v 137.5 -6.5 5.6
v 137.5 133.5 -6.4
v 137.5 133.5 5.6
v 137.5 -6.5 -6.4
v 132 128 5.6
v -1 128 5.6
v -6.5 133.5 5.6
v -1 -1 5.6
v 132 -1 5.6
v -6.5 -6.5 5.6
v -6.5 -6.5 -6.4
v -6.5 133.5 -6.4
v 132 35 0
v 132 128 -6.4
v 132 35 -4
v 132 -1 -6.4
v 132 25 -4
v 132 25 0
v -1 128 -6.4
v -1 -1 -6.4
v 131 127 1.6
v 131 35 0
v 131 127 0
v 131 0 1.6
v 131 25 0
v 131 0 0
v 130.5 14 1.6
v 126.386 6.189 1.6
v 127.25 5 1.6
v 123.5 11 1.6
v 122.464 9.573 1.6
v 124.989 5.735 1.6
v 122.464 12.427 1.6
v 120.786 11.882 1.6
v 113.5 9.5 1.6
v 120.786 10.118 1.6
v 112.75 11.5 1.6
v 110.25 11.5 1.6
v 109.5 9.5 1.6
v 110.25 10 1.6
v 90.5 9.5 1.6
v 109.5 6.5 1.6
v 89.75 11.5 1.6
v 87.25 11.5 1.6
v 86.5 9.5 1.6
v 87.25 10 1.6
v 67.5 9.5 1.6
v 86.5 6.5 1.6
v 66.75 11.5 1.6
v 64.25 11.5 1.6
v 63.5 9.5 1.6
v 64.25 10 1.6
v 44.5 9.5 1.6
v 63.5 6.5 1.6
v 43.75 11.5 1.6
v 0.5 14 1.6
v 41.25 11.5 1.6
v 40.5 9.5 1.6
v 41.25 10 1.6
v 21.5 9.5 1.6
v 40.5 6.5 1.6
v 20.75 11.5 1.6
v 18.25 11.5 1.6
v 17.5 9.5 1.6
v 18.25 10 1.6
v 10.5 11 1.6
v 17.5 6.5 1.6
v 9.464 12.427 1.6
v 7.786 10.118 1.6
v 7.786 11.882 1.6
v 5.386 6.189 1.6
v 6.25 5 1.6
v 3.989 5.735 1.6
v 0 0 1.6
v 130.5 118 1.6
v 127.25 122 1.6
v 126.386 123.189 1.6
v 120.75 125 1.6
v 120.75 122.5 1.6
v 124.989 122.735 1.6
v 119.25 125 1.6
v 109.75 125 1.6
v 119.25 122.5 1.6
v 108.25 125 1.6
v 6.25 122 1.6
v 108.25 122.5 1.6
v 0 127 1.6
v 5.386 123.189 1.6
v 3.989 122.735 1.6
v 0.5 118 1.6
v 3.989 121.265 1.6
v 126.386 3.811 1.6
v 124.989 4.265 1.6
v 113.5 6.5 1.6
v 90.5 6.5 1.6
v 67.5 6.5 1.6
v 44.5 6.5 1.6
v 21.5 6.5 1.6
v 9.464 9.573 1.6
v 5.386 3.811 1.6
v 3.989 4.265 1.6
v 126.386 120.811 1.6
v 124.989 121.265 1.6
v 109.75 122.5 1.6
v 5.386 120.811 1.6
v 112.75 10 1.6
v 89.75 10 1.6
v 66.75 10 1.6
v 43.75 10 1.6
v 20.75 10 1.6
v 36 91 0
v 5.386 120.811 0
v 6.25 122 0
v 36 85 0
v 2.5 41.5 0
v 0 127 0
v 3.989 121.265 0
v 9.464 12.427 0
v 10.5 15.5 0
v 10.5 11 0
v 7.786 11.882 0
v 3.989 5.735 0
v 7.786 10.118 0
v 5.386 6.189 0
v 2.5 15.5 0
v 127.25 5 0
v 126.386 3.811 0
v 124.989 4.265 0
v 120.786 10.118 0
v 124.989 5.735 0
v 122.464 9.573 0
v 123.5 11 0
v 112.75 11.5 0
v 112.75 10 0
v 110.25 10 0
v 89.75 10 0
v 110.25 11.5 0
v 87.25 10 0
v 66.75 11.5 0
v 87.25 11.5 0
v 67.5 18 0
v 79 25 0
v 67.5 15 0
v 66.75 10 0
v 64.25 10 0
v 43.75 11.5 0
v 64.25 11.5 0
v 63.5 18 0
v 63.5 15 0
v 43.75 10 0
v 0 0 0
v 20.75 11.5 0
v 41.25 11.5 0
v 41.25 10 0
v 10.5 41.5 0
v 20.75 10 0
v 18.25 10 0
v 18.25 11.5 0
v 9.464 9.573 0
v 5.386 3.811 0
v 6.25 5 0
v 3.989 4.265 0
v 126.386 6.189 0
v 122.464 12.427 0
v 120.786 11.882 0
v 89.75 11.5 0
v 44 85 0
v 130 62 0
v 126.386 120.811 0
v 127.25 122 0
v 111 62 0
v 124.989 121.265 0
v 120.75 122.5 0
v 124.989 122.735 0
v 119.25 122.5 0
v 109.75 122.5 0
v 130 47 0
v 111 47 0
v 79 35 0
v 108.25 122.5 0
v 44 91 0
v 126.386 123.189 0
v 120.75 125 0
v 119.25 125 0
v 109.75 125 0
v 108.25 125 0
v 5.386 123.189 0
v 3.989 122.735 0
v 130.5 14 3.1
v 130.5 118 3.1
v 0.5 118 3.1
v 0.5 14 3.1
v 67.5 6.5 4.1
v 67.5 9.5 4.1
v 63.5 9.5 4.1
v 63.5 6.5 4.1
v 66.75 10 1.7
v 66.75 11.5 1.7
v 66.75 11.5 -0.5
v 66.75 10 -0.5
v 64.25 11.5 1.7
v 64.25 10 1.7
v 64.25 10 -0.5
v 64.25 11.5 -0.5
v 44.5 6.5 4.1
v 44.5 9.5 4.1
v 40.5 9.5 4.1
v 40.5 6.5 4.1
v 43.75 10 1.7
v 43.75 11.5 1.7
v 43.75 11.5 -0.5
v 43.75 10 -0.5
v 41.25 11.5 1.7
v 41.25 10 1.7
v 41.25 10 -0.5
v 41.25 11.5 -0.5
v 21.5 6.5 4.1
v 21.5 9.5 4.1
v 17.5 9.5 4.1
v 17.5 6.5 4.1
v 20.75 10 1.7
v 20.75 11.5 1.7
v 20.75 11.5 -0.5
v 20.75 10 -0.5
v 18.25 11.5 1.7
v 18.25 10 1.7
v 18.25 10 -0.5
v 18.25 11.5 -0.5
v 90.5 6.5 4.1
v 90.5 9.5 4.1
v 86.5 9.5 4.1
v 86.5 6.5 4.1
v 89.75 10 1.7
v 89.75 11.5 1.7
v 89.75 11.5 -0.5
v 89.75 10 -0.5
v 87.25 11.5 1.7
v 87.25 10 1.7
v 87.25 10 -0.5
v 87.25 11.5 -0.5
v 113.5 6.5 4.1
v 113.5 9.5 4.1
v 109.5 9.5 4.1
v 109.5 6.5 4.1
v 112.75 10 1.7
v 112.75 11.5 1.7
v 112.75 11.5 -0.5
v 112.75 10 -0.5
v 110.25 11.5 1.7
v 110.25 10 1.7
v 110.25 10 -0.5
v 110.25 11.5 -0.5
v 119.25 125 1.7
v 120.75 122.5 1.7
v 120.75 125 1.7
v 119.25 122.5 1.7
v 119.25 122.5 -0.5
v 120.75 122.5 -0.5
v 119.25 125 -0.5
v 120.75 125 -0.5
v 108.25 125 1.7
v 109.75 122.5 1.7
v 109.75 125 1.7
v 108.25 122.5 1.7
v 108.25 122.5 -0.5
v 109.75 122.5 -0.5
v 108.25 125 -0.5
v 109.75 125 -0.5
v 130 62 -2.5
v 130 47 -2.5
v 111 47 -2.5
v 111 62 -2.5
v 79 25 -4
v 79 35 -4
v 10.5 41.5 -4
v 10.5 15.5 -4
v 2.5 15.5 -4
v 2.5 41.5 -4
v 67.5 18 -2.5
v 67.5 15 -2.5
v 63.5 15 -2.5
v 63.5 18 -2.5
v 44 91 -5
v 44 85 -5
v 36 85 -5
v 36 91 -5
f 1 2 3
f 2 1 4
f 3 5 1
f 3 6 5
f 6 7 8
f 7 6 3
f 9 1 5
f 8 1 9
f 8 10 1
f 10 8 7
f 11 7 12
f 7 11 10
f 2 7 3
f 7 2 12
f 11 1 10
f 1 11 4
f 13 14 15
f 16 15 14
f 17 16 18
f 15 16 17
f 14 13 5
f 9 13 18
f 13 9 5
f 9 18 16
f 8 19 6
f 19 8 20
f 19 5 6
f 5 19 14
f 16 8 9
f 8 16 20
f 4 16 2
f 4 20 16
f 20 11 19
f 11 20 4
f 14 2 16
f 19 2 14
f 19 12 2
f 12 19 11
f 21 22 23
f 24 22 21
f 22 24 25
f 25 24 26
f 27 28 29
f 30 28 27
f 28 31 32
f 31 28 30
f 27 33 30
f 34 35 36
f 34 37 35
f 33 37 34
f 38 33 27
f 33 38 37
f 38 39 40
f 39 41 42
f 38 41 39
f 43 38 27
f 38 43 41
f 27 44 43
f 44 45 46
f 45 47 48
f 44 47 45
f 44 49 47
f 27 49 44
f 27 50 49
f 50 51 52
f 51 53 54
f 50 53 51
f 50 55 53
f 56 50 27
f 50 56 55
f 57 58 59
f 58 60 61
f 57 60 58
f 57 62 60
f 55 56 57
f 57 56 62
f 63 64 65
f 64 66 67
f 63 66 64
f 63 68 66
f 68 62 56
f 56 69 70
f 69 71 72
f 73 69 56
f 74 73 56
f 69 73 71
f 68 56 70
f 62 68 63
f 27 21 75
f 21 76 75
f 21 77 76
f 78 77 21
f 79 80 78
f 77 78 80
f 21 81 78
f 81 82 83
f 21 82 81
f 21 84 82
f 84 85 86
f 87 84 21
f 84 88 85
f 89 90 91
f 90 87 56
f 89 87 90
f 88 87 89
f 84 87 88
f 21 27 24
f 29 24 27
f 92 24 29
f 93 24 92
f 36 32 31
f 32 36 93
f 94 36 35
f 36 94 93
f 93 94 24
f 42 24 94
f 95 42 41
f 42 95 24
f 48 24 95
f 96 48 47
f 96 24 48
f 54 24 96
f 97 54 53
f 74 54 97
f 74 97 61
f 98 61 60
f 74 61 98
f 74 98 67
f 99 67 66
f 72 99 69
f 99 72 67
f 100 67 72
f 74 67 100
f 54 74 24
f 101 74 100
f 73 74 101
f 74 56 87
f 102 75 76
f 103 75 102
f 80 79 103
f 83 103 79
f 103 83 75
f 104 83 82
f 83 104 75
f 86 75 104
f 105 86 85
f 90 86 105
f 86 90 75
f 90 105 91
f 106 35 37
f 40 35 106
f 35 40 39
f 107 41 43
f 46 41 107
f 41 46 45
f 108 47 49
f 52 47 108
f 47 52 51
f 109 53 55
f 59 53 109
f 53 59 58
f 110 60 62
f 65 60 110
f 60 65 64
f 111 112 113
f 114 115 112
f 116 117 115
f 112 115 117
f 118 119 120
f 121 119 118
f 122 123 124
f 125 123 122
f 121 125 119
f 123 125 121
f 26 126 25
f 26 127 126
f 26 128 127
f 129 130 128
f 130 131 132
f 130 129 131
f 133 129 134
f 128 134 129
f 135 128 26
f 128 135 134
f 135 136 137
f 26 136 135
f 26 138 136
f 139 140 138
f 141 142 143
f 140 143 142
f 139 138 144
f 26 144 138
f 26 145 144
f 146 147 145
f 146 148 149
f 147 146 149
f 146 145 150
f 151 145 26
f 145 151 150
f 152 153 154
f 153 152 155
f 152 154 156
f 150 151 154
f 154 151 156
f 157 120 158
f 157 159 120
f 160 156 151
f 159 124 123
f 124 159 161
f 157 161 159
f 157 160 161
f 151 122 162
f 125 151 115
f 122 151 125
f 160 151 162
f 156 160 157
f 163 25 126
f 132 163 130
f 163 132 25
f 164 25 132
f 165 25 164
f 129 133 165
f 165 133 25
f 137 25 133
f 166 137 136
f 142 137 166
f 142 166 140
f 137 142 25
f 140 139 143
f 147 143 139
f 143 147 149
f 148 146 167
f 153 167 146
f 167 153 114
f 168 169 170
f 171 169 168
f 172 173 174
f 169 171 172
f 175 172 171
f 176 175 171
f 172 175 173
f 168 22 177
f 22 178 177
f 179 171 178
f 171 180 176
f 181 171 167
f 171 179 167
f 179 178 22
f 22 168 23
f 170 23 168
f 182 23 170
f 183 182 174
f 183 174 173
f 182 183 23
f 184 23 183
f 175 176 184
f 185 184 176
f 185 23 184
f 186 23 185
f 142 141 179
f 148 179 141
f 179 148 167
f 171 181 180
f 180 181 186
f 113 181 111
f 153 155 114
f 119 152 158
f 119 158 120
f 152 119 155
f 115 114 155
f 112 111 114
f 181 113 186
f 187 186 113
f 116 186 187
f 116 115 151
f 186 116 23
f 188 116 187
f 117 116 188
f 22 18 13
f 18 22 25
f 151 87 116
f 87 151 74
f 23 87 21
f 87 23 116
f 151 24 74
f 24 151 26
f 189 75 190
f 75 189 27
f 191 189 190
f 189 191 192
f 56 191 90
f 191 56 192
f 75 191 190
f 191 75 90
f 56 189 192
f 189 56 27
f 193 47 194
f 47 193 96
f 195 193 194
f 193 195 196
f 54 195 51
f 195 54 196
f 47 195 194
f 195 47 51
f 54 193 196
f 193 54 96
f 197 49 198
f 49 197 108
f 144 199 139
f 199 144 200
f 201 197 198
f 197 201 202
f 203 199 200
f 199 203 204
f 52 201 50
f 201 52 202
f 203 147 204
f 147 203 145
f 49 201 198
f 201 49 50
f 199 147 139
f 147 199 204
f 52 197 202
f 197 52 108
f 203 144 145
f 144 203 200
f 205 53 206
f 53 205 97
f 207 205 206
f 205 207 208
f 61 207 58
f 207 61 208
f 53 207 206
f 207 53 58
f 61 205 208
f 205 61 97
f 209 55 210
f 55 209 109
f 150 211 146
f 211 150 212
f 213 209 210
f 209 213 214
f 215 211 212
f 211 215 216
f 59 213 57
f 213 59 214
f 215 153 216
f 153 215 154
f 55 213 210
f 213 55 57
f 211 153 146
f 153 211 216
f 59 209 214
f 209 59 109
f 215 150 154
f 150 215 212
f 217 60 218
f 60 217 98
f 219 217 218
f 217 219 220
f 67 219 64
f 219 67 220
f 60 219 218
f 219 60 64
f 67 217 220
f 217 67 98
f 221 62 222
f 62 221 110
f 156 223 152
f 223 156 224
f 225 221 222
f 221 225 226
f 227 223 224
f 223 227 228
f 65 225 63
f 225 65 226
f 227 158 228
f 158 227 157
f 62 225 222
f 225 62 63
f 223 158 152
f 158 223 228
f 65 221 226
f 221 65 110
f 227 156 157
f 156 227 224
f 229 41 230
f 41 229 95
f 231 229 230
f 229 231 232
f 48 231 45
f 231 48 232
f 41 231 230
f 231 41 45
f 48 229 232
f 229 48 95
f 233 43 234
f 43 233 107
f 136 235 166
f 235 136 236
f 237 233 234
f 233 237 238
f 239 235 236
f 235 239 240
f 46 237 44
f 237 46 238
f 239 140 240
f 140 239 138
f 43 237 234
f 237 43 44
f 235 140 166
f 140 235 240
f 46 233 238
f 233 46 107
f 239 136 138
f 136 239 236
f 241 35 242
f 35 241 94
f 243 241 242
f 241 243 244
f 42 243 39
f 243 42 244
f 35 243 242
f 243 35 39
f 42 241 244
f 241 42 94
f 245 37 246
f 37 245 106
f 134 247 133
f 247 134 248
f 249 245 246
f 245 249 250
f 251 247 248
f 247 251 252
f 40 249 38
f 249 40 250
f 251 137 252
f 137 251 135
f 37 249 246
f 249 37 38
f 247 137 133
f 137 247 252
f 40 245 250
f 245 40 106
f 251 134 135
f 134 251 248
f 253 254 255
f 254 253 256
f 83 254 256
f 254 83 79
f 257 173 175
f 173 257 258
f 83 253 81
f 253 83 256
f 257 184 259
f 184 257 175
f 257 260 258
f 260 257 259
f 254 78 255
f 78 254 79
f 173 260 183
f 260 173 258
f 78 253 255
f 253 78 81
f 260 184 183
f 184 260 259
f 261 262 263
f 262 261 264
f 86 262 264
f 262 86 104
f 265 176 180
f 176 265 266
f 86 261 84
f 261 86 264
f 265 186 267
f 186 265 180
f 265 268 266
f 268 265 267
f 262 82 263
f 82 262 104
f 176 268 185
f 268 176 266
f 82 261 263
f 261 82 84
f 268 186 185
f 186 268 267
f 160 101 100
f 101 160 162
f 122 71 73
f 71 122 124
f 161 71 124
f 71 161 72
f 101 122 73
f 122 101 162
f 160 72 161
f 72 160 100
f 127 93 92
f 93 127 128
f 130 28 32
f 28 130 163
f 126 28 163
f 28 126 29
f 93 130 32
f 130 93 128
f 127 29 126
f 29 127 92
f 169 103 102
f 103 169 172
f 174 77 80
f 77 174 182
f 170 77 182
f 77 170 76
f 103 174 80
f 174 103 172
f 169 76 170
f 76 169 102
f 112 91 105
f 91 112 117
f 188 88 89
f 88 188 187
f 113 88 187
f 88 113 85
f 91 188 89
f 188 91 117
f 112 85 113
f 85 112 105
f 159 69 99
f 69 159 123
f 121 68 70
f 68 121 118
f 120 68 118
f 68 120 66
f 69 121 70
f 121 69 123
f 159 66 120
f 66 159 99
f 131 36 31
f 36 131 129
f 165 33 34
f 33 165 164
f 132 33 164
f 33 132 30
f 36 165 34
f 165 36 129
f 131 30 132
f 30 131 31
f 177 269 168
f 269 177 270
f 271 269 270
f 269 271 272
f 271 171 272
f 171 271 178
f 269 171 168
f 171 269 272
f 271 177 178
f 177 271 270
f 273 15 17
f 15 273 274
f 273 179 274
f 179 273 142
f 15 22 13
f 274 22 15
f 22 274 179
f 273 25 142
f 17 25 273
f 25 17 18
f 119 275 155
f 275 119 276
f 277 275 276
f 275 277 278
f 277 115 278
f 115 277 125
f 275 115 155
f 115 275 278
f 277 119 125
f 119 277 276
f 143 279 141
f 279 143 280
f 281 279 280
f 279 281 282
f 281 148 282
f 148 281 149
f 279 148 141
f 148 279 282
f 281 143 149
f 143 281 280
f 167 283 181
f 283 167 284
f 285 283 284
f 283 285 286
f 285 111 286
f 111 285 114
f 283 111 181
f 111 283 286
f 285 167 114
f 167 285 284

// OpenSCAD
// file: ../../libs/flat-ui-colors.scad
flatui = [
    "#1abc9c",
    "#2ecc71",
    "#3498db",
    "#9b59b6",
    "#34495e",
    "#f1c40f",
    "#e67e22",
    "#e74c3c",
    "#ecf0f1",
    "#95a5a6",
];
// file: ../../libs/teeth.scad
function hash(h,k)= 
(
  h[search([k], h)[0]][1]
); 

module placeTeethY(start, step, count, size) {
    for(i = [0:count]) {
        y = start + (i * step);
        translate([0, y, 0])
        cube(size, center=true);
    }
}

module placeTeethZ(start, step, count, size) {
    for(i = [0:count]) {
        z = start + (i * step);
        translate([0, 0, z])
        cube(size, center=true);
    }
}

module verticalTeeth(translateZ, widthY, depthX, heightZ, count, size, height, spaceBetween = false, padding = 0, nothing = 0.1) {
    avSpace = widthY - (size * count);
    padding = (padding==undef) ? 0 : padding;
    ts = [depthX + nothing + padding, size, height + nothing + padding];
    if (spaceBetween) {
        tbSpace = avSpace / (count - 1);
        tbStep = tbSpace + size;
        tbStart = -(widthY / 2) + (size / 2);
        
        translate([0, 0, translateZ])
        placeTeethY(tbStart, tbStep, count-1, ts);
    } else {
        tbSpace = avSpace / (count + 1);
        tbStep = tbSpace + size;
        tbStart = -(widthY / 2) + tbSpace + (size / 2);
        
        translate([0, 0, translateZ])
        placeTeethY(tbStart, tbStep, count-1, ts);
    }
}

module horizontalTeeth(translateY, widthY, depthX, heightZ, count, size, height, spaceBetween = false, padding = 0, nothing = 0.1) {
    avSpace = heightZ - (size * count);
    padding = (padding==undef) ? 0 : padding;
    ts = [depthX + nothing + padding, height + nothing + padding, size];
    if (spaceBetween) {
        tbSpace = avSpace / (count - 1);
        tbStep = tbSpace + size;
        tbStart = -(heightZ / 2) + (size / 2);
        
        translate([0, translateY, 0])
        placeTeethZ(tbStart, tbStep, count-1, ts);
    } else {
        tbSpace = avSpace / (count + 1);
        tbStep = tbSpace + size;
        tbStart = -(heightZ / 2) + tbSpace + (size / 2);
        
        translate([0, translateY, 0])
        placeTeethZ(tbStart, tbStep, count-1, ts);
    }
}

module bottomTeeth(widthY, depthX, heightZ, count, size, height, spaceBetween = false, padding = 0, nothing = 0.1) {
    z = -(heightZ / 2)-(height/2);
    verticalTeeth(z, widthY, depthX, heightZ, count, size, height, spaceBetween, padding, nothing);
}

module topTeeth(widthY, depthX, heightZ, count, size, height, spaceBetween = false, padding = 0, nothing = 0.1) {
    z = (heightZ / 2)+(height/2);
    verticalTeeth(z, widthY, depthX, heightZ, count, size, height, spaceBetween, padding, nothing);
}

module leftTeeth(widthY, depthX, heightZ, count, size, height, spaceBetween = false, padding = 0, nothing = 0.1) {
    y = -(widthY / 2)-(height / 2);
    horizontalTeeth(y, widthY, depthX, heightZ, count, size, height, spaceBetween, padding, nothing);
}

module rightTeeth(widthY, depthX, heightZ, count, size, height, spaceBetween = false, padding = 0, nothing = 0.1) {
    y = (widthY / 2) + (height / 2);
    horizontalTeeth(y, widthY, depthX, heightZ, count, size, height, spaceBetween, padding, nothing);
}

module teeth(size, opts, nothing = 0.1) {
    union() {
        color("#ef5777") cube(size, center=true);
        
        bc = hash(opts, "bottomCount");
        if (bc > 0) {        
            color("#575fcf") bottomTeeth(
                widthY = size[1],
                depthX = size[0],
                heightZ = size[2],
                count = hash(opts, "bottomCount"),
                size = hash(opts, "bottomSize"),
                height = hash(opts, "bottomHeight"),
                spaceBetween = hash(opts, "bottomSpaceBetween"),
                padding = hash(opts, "bottomPadding"),
                nothing = nothing
            );
        }
        
        tc = hash(opts, "topCount");
        if (tc > 0) {        
            color("#4bcffa") topTeeth(
                widthY = size[1],
                depthX = size[0],
                heightZ = size[2],
                count = hash(opts, "topCount"),
                size = hash(opts, "topSize"),
                height = hash(opts, "topHeight"),
                spaceBetween = hash(opts, "topSpaceBetween"),
                padding = hash(opts, "topPadding"),
                nothing = nothing
            );
        }
        
        lc = hash(opts, "leftCount");
        if (lc > 0) {        
            color("#0be881") leftTeeth(
                widthY = size[1],
                depthX = size[0],
                heightZ = size[2],
                count = hash(opts, "leftCount"),
                size = hash(opts, "leftSize"),
                height = hash(opts, "leftHeight"),
                spaceBetween = hash(opts, "leftSpaceBetween"),
                padding = hash(opts, "leftPadding"),
                nothing = nothing
            );
        }
        
        rc = hash(opts, "rightCount");
        if (rc > 0) {        
            color("#ffc048") rightTeeth(
                widthY = size[1],
                depthX = size[0],
                heightZ = size[2],
                count = hash(opts, "rightCount"),
                size = hash(opts, "rightSize"),
                height = hash(opts, "rightHeight"),
                spaceBetween = hash(opts, "rightSpaceBetween"),
                padding = hash(opts, "rightPadding"),
                nothing = nothing
            );
        }
    }
}


/*opts=[
    ["bottomCount", 3],    
    ["bottomSize", 6],
    ["bottomHeight", 10],
    ["bottomSpaceBetween", true],
    ["bottomPadding", 0.2],

    ["topCount", 3],    
    ["topSize", 6],
    ["topHeight", 10],
    ["topSpaceBetween", false],

    ["leftCount", 3],    
    ["leftSize", 4],
    ["leftHeight", 10],
    ["leftSpaceBetween", true],

    ["rightCount", 2],    
    ["rightSize", 4],
    ["rightHeight", 10],
    ["rightSpaceBetween", false],
];
teeth(size=[10, 50, 30], opts=opts);
*/
// file: ../../libs/t-joint.scad
/**
       Copyright 2016 Matthew Gaunt

   Licensed under the Apache License, Version 2.0 (the "License");
   you may not use this file except in compliance with the License.
   You may obtain a copy of the License at

       http://www.apache.org/licenses/LICENSE-2.0

   Unless required by applicable law or agreed to in writing, software
   distributed under the License is distributed on an "AS IS" BASIS,
   WITHOUT WARRANTIES OR CONDITIONS OF ANY KIND, either express or implied.
   See the License for the specific language governing permissions and
   limitations under the License.
**/

/**
th = thickness
bD = bolt diameter
bH = bolt height
sD = screw diameter
sL = screw length
**/
module createTJoint(th, bD, bH, sD, sL, endspacing = 2, nothing = 0.1) {
    union() {
        translate([0, 0, (sL / 2) - nothing])
        color("#ef5777") cube([sD, th + nothing, sL + nothing], center = true);

        translate([0, 0, sL - (bH / 2) - endspacing])
        color("#575fcf") cube([bD, th + nothing, bH], center = true);
        
        translate([0, 0, -(th / 2)])
        color("#4bcffa") cylinder(th + nothing, d=sD, center=true);
    }
}

// Remember https://www.trfastenings.com/Products/knowledgebase/Tables-Standards-Terminology/Tapping-Sizes-and-Clearance-Holes

// createTJoint(th=3, bD=5.5, bH=2.5, sD=3.4, sL=7);
// main file
include <../../libs/t-joint.scad>;
include <../../libs/teeth.scad>;
include <../../libs/flat-ui-colors.scad>;

thickness = 3;

pcbX = 131;
pcbY = 127;
pcbH = 1.6;
pcbPadding = 0.25;
pcbScreenX = 126;
pcbScreenY = 100;
pcbScreenZ = 1.5;
// Sloppy fixing of the screen can cause issues
pcbScreenXYPadding = 2;
pcbScreenZPadding = 0.25;

switchX = 4;
switchY = 3;
switchZ = 2.5;

casePadding = 6;
lowerLayerCount = 6;
topLayerCount = 2;

m3HoleD = 3.4;

pcbCasePadding = 1;
caseEdgesWidth = (casePadding * 2) + pcbCasePadding;
frontZ = pcbH + switchZ + 1.5;

module pcbLED() {
    translate([0, 0, -0.5]) {
        color(flatui[1]) cube([2.5, 1.5, 0.5 + pcbH + 0.1]);
    }
}

module pcb(cutout = false) {
    if (cutout == false) {
        difference() {
            union() {
                color(flatui[3]) cube([pcbX, pcbY, pcbH]);
                
                screenX = pcbScreenX + (pcbScreenXYPadding * 2);
                screenY = pcbScreenY + (pcbScreenXYPadding * 2);
                translate([(pcbX-screenX) / 2, 16 - pcbScreenXYPadding, pcbH]) {
                    color(flatui[4]) cube([screenX, screenY, pcbScreenZ]);
                }
                
                switchesY = 6.5;
                switchesXSpace = 19;
                
                ledsY = switchesY + switchY + 0.5;
                ledsXSpace = (switchX - 2.5) / 2;
                
                cX = (pcbX / 2) - (switchX / 2);
                translate([cX, switchesY, pcbH]) {
                    color(flatui[5]) cube([switchX, switchY, switchZ]);
                }
                translate([cX + ledsXSpace, ledsY, 0]) pcbLED();
                
                bX = cX - switchesXSpace - switchX;
                translate([bX, switchesY, pcbH]) {
                    color(flatui[5]) cube([switchX, switchY, switchZ]);
                }
                translate([bX + ledsXSpace, ledsY, 0]) pcbLED();
                
                aX = bX - switchesXSpace - switchX;
                translate([aX, switchesY, pcbH]) {
                    color(flatui[5]) cube([switchX, switchY, switchZ]);
                }
                translate([aX + ledsXSpace, ledsY, 0]) pcbLED();
                
                dX = cX + switchX + switchesXSpace;
                translate([dX, switchesY, pcbH]) {
                    color(flatui[5]) cube([switchX, switchY, switchZ]);
                }
                translate([dX + ledsXSpace, ledsY, 0]) pcbLED();
                
                eX = dX + switchX + switchesXSpace;
                translate([eX, switchesY, pcbH]) {
                    color(flatui[5]) cube([switchX, switchY, switchZ]);
                }
                translate([eX + ledsXSpace, ledsY, 0]) pcbLED();
                
                // Wifi LED
                translate([pcbX - 11 + (1.5 / 2), pcbY - 2 - 2.5, 0]) rotate([0, 0, 90]) pcbLED();
                
                // Status LED
                translate([pcbX - 22 + (1.5 / 2), pcbY - 2 - 2.5, 0]) rotate([0, 0, 90]) pcbLED();
            }
            
            translate([5, 5, 0]) {
                color(flatui[5]) cylinder(h=20, d=2.5, center=true);
            }
            
            translate([pcbX - 5, 5, 0]) {
                color(flatui[5]) cylinder(h=20, d=2.5, center=true);
            }
            
            translate([pcbX - 5, pcbY - 5, 0]) {
                color(flatui[5]) cylinder(h=20, d=2.5, center=true);
            }
            
            translate([5, pcbY - 5, 0]) {
                color(flatui[5]) cylinder(h=20, d=2.5, center=true);
            }
            
            translate([9, 11, 0]) {
                color(flatui[6]) cylinder(h=20, d=3, center=true);
            }
            
            translate([pcbX-9, 11, 0]) {
                color(flatui[6]) cylinder(h=20, d=3, center=true);
            }
        }
        
        // SDCard
        translate([pcbX - 20, 47, -2.5]) color(flatui[2]) cube([19, 15, 2.5]);
        
        // Micro USB
        translate([pcbX - 52, 25, -4]) color(flatui[4]) cube([53, 10, 4]);
        
        // Pin Headers
        translate([2.5, 15.5, -4]) color(flatui[2]) cube([8, 26, 4]);
        
        // Reset Button
        translate([(pcbX / 2) - (switchX / 2), 15, -switchZ]) color(flatui[2]) cube([switchX, switchY, switchZ]);
        
        // Power PST
        translate([36, 85, -5]) color(flatui[2]) cube([8, 6, 5]);
    }
}

module shellLayer() {
    difference() {
        translate([-(caseEdgesWidth / 2), -(caseEdgesWidth / 2), 0]) cube([pcbX + caseEdgesWidth, pcbY + caseEdgesWidth, thickness]);
        
        translate([-1, -1, -50]) cube([pcbX + 2, pcbY + 2, 100]); 
    }
}

module shellLayers() {
    translate([0, 0, frontZ - thickness]) color(flatui[1]) shellLayer();
    translate([0, 0, frontZ - (thickness * 2)]) color(flatui[2]) shellLayer();
    translate([0, 0, frontZ - (thickness * 3)]) color(flatui[4]) shellLayer();
    translate([0, 0, frontZ - (thickness * 4)]) color(flatui[5]) shellLayer();
}

module clearLayer() {
    cube([pcbX + caseEdgesWidth, pcbY + caseEdgesWidth, thickness]);
}

module clearLayers() {
    translate([-(caseEdgesWidth / 2), -(caseEdgesWidth / 2), frontZ]) clearLayer();
    translate([-(caseEdgesWidth / 2), -(caseEdgesWidth / 2), frontZ - (thickness * 5)]) clearLayer();
}

module renderModel() {
    /* plateLayer();
    belowPlateLayers();
    abovePlateLayers();
    parts(false);*/
    
    // clearLayers();
    
    shellLayers();
    
    pcb();
}

renderModel();
